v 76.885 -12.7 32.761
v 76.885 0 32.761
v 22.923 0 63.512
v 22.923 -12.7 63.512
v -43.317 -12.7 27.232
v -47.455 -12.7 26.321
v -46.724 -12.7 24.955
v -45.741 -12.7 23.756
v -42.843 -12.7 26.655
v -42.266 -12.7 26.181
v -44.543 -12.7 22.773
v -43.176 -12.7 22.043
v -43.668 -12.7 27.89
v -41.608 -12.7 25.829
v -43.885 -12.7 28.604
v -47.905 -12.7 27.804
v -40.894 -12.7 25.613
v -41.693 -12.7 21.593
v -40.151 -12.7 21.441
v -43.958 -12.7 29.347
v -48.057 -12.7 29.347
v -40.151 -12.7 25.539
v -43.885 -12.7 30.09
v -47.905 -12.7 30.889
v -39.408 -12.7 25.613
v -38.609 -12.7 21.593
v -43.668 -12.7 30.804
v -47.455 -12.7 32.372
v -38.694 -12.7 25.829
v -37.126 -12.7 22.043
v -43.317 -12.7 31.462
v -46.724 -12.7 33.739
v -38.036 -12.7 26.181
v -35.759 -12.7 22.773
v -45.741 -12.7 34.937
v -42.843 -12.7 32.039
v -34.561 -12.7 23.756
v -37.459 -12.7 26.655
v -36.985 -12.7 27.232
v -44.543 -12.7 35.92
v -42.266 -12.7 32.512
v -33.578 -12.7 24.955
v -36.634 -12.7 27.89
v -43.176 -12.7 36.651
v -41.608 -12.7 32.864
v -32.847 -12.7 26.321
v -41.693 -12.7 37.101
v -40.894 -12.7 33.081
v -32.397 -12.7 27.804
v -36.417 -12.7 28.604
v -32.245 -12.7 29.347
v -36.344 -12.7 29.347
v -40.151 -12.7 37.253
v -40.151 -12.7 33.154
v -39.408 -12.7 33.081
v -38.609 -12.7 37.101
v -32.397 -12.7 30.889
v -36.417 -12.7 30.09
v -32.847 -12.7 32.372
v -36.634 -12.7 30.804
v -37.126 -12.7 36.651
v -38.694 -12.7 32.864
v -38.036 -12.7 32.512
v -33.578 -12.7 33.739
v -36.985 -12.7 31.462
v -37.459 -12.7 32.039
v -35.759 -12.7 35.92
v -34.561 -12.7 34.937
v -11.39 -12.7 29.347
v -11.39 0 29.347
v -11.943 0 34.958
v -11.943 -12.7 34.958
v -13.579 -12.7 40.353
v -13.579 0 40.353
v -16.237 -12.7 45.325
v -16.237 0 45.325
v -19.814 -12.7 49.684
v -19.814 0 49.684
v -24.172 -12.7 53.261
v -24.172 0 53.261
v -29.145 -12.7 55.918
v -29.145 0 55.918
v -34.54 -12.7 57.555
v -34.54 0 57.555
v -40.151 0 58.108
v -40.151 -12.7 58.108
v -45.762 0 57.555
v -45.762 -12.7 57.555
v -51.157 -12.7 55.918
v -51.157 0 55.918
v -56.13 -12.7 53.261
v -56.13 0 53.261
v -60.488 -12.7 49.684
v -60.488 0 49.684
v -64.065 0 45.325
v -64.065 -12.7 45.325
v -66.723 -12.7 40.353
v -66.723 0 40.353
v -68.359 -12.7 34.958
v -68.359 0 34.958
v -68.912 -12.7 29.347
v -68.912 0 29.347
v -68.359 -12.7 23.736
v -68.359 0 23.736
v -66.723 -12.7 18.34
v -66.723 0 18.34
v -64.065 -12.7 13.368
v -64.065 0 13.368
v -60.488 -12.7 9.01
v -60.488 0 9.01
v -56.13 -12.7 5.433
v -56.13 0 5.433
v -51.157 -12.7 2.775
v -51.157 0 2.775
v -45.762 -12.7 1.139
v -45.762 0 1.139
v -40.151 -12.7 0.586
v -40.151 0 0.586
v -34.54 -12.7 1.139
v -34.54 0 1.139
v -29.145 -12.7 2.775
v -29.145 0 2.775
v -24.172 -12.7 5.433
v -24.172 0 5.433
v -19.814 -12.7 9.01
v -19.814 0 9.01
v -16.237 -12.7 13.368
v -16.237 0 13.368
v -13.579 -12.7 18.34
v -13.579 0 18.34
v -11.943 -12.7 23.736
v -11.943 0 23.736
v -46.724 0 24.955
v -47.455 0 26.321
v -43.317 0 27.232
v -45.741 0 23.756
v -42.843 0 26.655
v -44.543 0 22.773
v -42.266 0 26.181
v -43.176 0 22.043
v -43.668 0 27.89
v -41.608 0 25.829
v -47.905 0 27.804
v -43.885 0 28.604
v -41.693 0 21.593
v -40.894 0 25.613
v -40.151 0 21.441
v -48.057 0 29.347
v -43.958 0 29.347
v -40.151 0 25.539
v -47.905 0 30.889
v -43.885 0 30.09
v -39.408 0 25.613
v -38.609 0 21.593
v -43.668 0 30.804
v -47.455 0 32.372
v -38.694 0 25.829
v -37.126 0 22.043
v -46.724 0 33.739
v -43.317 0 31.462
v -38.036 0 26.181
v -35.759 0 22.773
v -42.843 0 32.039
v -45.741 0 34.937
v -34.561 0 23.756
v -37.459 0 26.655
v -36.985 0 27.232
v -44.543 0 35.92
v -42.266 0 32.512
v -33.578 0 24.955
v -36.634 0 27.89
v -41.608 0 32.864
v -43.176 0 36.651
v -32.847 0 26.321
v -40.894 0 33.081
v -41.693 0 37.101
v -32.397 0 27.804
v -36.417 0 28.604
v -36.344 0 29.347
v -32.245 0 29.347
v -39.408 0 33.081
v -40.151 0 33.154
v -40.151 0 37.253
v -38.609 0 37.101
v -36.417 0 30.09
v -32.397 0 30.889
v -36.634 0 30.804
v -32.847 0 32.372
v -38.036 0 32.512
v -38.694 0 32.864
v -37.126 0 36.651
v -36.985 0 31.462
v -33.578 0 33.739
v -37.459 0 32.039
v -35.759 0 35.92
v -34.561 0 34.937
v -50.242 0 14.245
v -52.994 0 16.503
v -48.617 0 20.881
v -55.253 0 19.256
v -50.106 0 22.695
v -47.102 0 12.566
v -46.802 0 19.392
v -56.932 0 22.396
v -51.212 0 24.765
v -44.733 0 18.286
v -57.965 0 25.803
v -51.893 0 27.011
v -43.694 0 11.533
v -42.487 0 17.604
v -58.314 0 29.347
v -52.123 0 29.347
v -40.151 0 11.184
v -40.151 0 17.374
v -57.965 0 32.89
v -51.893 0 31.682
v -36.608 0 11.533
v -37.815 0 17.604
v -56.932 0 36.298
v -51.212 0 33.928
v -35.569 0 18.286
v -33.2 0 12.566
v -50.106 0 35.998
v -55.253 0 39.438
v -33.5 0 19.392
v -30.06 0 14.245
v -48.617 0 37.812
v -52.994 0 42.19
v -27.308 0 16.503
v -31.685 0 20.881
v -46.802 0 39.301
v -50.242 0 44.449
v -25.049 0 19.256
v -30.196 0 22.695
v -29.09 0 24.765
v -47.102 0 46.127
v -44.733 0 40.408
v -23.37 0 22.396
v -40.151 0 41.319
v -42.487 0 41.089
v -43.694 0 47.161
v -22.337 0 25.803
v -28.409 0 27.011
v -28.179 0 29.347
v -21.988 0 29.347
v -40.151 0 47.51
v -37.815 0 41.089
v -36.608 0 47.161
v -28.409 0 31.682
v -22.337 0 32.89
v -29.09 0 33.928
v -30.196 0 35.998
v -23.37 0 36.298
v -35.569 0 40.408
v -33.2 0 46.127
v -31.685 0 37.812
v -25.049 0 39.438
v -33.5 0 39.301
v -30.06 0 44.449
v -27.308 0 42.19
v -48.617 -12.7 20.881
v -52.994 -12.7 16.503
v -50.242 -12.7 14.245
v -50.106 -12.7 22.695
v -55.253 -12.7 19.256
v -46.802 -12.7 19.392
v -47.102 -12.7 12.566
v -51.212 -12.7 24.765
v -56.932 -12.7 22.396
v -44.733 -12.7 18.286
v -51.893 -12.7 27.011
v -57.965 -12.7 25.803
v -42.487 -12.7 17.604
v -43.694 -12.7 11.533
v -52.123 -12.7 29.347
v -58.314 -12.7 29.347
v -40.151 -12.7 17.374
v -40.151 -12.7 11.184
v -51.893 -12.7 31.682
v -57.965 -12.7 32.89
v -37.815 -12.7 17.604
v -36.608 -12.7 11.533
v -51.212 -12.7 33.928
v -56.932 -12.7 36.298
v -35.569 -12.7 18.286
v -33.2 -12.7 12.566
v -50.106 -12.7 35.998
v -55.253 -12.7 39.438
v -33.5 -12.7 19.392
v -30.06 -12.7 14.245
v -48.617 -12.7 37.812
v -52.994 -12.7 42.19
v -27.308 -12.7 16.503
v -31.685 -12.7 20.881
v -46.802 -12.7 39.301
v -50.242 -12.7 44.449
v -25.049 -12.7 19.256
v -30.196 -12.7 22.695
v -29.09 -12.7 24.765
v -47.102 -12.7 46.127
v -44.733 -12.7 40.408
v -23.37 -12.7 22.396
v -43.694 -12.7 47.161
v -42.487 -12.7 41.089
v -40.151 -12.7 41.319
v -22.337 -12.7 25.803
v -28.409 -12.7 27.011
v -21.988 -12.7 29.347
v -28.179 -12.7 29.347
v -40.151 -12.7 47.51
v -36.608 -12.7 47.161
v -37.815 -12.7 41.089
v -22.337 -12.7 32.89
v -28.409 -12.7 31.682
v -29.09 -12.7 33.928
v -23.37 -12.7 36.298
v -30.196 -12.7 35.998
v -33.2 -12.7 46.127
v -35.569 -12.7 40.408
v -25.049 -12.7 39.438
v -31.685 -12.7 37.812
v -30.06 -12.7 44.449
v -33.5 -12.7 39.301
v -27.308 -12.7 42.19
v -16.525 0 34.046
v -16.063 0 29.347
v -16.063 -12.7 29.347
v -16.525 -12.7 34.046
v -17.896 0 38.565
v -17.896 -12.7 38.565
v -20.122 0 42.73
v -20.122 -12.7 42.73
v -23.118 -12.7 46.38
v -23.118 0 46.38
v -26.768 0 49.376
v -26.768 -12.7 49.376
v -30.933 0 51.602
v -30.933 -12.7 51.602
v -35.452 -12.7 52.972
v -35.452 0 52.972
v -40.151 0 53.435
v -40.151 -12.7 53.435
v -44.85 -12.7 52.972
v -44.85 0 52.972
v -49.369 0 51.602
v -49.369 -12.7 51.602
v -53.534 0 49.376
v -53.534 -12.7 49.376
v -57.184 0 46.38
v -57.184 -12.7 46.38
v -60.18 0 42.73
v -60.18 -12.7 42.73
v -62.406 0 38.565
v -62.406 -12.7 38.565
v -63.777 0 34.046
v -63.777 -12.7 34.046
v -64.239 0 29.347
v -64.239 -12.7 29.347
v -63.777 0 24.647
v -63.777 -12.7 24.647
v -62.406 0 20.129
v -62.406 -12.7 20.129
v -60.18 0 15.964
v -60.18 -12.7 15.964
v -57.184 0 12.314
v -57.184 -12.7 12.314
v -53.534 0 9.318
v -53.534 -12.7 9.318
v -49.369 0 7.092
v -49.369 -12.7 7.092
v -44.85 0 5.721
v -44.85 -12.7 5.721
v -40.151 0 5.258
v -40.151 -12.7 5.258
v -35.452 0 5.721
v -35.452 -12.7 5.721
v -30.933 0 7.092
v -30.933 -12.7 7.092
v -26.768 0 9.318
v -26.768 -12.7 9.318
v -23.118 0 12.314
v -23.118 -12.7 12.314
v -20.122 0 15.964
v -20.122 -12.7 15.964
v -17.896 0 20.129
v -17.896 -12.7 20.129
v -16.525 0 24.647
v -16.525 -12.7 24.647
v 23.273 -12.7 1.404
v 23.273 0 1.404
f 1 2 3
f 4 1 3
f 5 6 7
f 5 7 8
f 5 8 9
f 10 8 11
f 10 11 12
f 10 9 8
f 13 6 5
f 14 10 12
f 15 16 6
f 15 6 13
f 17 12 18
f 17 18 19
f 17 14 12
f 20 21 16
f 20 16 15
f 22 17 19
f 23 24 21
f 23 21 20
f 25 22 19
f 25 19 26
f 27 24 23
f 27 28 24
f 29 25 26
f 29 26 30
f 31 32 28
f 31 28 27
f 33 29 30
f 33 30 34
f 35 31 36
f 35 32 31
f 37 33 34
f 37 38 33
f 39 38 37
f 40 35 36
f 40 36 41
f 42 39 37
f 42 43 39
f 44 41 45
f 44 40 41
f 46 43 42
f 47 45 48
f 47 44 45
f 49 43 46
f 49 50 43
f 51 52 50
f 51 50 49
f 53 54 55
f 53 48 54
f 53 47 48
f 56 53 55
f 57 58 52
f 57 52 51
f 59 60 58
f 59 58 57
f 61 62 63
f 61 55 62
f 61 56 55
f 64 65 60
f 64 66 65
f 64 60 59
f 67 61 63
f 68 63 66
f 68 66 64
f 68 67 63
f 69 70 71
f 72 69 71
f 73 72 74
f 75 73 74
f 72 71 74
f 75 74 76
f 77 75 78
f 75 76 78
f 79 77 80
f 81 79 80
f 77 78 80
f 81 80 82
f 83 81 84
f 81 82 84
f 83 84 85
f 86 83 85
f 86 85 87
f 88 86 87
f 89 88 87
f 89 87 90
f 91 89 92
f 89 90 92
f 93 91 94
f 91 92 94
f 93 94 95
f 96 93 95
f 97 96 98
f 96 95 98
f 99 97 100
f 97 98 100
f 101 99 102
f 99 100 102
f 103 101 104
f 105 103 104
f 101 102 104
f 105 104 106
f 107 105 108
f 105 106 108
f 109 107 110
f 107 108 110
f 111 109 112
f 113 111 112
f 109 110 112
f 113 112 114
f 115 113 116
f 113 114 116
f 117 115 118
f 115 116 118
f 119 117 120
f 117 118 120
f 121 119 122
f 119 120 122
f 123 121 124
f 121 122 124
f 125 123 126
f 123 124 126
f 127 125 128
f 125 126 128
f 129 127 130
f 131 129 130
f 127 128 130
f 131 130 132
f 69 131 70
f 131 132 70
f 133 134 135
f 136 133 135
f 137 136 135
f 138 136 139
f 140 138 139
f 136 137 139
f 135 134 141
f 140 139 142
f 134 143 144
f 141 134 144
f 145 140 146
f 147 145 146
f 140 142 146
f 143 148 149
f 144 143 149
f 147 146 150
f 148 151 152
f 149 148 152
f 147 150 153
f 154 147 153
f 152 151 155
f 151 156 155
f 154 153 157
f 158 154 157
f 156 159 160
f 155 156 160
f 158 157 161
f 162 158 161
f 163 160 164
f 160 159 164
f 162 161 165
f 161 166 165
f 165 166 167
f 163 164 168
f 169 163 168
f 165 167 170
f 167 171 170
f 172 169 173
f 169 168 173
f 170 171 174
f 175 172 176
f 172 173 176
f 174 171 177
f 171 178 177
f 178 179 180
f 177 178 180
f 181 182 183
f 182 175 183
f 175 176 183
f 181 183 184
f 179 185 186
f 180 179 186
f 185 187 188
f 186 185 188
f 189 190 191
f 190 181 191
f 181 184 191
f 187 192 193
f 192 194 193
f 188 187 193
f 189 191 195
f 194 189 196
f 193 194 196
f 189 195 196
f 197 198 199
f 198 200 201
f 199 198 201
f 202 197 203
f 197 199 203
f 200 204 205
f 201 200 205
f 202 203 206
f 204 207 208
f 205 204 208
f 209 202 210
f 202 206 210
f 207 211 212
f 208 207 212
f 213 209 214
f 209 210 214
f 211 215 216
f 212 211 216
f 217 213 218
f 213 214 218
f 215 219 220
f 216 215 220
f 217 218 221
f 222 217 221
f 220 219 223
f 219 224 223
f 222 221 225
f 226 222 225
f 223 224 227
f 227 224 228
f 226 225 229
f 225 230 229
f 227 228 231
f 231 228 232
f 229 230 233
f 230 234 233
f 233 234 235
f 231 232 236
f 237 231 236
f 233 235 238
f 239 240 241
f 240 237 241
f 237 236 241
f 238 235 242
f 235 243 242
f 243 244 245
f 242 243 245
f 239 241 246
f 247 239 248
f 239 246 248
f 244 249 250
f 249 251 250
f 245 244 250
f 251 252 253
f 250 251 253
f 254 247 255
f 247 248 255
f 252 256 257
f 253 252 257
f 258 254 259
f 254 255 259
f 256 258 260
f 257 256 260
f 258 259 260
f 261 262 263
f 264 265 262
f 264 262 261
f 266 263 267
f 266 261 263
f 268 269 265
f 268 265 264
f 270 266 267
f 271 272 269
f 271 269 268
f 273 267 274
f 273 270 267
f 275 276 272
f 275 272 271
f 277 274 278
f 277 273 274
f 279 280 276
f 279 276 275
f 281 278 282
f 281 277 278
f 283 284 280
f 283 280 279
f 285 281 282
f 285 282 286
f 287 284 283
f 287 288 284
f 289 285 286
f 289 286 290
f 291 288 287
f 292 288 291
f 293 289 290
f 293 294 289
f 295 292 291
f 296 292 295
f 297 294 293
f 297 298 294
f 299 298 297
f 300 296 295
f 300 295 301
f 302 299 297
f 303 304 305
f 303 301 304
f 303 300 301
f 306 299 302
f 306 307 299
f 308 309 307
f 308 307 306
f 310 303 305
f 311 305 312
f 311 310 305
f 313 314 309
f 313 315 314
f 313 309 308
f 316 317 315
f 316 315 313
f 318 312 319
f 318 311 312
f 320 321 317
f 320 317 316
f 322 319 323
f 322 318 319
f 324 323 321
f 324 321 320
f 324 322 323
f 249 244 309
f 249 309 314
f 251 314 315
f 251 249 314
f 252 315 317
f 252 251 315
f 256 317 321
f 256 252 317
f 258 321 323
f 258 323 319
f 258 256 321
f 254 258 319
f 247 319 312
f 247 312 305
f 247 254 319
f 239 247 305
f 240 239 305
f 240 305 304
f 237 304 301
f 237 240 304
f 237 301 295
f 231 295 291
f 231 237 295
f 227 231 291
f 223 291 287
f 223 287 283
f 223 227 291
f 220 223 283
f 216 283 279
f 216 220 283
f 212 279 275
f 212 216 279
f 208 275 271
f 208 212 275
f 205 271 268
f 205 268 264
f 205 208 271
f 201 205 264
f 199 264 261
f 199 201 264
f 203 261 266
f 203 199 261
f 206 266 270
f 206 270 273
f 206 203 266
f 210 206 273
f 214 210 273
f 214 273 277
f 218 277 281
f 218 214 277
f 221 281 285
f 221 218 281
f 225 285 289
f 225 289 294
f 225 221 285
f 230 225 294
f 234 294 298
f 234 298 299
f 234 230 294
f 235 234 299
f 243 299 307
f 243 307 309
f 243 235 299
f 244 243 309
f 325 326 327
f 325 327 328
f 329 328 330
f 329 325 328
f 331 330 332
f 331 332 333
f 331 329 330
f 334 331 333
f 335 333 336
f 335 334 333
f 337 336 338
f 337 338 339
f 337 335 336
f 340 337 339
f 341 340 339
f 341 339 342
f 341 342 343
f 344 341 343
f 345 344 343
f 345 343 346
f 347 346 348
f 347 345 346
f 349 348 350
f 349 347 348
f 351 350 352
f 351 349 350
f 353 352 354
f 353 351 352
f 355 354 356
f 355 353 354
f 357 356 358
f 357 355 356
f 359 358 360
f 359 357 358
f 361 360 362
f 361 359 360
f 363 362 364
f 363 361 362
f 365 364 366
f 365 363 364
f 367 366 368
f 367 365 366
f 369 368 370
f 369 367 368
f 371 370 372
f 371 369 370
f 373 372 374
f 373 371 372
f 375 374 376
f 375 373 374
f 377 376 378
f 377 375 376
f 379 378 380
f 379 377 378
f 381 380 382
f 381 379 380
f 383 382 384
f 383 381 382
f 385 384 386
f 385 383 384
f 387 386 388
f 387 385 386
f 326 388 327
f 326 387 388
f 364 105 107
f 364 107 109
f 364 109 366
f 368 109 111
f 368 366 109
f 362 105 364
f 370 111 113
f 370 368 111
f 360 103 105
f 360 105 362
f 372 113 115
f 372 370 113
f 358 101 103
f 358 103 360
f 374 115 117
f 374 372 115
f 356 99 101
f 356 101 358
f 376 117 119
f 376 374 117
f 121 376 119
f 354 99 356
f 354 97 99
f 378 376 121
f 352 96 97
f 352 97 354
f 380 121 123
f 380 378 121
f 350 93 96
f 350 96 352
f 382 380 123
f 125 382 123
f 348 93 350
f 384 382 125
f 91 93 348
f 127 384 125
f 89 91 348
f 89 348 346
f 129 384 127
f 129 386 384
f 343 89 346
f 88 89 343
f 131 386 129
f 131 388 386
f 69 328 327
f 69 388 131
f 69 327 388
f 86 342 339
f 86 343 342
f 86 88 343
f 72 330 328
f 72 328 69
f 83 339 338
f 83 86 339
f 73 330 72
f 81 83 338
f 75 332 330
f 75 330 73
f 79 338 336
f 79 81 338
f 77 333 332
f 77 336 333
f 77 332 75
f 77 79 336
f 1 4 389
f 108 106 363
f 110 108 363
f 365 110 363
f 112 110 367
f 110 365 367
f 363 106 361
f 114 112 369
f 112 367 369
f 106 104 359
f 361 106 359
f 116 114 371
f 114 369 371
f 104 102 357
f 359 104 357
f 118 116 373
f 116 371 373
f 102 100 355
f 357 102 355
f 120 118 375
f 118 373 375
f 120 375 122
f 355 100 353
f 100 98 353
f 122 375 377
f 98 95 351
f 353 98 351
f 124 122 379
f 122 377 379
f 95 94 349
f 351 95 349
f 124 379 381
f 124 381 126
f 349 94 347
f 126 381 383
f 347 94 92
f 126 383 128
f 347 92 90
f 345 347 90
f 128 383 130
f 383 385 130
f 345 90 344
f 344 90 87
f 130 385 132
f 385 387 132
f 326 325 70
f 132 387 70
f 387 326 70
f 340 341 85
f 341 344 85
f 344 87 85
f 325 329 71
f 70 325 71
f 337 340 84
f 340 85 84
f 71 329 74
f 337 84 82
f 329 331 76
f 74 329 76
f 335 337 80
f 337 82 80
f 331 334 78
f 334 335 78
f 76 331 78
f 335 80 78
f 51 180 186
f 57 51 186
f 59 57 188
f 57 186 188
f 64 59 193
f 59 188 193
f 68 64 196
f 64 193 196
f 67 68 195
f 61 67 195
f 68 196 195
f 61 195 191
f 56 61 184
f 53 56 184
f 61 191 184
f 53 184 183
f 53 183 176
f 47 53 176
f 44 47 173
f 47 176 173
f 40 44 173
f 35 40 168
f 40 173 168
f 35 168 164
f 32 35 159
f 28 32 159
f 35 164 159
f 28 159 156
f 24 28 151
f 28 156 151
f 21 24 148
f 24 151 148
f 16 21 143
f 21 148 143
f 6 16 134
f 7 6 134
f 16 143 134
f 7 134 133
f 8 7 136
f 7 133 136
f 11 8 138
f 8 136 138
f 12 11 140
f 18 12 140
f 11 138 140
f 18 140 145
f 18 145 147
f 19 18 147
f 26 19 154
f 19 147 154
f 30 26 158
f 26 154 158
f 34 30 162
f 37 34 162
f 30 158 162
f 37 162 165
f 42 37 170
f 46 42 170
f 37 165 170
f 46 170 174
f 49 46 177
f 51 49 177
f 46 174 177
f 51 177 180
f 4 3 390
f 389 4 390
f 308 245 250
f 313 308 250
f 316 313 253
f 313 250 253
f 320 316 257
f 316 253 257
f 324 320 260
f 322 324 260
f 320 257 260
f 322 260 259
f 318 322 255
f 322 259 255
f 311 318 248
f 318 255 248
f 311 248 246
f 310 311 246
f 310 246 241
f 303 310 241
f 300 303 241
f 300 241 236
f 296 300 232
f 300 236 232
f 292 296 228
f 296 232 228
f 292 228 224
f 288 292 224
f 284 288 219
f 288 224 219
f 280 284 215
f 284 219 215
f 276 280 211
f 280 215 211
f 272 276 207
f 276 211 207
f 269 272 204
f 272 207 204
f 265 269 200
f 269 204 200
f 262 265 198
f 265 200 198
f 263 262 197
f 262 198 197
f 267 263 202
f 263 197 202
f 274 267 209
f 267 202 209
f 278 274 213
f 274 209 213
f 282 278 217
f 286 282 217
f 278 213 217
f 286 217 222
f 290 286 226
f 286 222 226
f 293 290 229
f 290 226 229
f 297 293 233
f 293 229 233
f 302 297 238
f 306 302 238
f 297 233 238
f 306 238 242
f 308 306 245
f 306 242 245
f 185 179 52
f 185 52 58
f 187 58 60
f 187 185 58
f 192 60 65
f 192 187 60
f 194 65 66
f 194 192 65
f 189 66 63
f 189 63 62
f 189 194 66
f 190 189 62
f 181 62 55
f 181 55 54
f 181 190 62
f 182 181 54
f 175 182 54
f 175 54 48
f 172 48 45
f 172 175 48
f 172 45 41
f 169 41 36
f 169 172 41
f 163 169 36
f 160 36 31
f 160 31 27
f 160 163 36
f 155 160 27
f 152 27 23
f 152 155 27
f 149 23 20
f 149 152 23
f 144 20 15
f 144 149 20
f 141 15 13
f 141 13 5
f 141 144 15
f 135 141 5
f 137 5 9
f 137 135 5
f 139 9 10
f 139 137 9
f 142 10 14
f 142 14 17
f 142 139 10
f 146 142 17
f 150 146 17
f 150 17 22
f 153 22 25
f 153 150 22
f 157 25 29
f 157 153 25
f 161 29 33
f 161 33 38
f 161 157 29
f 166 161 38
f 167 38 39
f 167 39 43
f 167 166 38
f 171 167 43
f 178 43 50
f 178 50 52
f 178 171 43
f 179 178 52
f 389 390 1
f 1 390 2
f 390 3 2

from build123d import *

# Parameters (mm, degrees)
F0_R     = 18.1632297986
F0_R_2   = 11.972296983
F2_DEPTH = 12.7
F0_R_3   = 28.7608650041
F0_R_4   = 24.0883927658
F0_R_5   = 7.905797456
F0_R_6   = 3.8073076238
F3_DEPTH = 12.7


with BuildPart() as f2:
    # F0 (on Front) → F2 (new body)
    with BuildSketch(Plane.XZ):
        with Locations((-40.1510037482, 29.3467342854)):
            Circle(F0_R)
        with Locations((-40.1510037482, 29.3467342854)):
            Circle(F0_R_2, mode=Mode.SUBTRACT)
    extrude(amount=F2_DEPTH)


with BuildPart() as f2b:
    # F0 (on Front) → F2, piece 2 (new body)
    with BuildSketch(Plane.XZ):
        with Locations((-40.1510037482, 29.3467342854)):
            Circle(F0_R_3)
        with Locations((-40.1510037482, 29.3467342854)):
            Circle(F0_R_4, mode=Mode.SUBTRACT)
    extrude(amount=F2_DEPTH)


with BuildPart() as f2c:
    # F0 (on Front) → F2, piece 3 (new body)
    with BuildSketch(Plane.XZ):
        with Locations((-40.1510037482, 29.3467342854)):
            Circle(F0_R_5)
        with Locations((-40.1510037482, 29.3467342854)):
            Circle(F0_R_6, mode=Mode.SUBTRACT)
    extrude(amount=F2_DEPTH)


with BuildPart() as f3:
    # F1 (on Front) → F3 (new body)
    with BuildSketch(Plane.XZ):
        Polygon((23.2733639794, 1.4035140155), (76.8851411623, 32.7613393785), (22.9225791991, 63.5115876794), align=None)
    extrude(amount=F3_DEPTH)


solid = Compound([f2.part, f2b.part, f2c.part, f3.part])
